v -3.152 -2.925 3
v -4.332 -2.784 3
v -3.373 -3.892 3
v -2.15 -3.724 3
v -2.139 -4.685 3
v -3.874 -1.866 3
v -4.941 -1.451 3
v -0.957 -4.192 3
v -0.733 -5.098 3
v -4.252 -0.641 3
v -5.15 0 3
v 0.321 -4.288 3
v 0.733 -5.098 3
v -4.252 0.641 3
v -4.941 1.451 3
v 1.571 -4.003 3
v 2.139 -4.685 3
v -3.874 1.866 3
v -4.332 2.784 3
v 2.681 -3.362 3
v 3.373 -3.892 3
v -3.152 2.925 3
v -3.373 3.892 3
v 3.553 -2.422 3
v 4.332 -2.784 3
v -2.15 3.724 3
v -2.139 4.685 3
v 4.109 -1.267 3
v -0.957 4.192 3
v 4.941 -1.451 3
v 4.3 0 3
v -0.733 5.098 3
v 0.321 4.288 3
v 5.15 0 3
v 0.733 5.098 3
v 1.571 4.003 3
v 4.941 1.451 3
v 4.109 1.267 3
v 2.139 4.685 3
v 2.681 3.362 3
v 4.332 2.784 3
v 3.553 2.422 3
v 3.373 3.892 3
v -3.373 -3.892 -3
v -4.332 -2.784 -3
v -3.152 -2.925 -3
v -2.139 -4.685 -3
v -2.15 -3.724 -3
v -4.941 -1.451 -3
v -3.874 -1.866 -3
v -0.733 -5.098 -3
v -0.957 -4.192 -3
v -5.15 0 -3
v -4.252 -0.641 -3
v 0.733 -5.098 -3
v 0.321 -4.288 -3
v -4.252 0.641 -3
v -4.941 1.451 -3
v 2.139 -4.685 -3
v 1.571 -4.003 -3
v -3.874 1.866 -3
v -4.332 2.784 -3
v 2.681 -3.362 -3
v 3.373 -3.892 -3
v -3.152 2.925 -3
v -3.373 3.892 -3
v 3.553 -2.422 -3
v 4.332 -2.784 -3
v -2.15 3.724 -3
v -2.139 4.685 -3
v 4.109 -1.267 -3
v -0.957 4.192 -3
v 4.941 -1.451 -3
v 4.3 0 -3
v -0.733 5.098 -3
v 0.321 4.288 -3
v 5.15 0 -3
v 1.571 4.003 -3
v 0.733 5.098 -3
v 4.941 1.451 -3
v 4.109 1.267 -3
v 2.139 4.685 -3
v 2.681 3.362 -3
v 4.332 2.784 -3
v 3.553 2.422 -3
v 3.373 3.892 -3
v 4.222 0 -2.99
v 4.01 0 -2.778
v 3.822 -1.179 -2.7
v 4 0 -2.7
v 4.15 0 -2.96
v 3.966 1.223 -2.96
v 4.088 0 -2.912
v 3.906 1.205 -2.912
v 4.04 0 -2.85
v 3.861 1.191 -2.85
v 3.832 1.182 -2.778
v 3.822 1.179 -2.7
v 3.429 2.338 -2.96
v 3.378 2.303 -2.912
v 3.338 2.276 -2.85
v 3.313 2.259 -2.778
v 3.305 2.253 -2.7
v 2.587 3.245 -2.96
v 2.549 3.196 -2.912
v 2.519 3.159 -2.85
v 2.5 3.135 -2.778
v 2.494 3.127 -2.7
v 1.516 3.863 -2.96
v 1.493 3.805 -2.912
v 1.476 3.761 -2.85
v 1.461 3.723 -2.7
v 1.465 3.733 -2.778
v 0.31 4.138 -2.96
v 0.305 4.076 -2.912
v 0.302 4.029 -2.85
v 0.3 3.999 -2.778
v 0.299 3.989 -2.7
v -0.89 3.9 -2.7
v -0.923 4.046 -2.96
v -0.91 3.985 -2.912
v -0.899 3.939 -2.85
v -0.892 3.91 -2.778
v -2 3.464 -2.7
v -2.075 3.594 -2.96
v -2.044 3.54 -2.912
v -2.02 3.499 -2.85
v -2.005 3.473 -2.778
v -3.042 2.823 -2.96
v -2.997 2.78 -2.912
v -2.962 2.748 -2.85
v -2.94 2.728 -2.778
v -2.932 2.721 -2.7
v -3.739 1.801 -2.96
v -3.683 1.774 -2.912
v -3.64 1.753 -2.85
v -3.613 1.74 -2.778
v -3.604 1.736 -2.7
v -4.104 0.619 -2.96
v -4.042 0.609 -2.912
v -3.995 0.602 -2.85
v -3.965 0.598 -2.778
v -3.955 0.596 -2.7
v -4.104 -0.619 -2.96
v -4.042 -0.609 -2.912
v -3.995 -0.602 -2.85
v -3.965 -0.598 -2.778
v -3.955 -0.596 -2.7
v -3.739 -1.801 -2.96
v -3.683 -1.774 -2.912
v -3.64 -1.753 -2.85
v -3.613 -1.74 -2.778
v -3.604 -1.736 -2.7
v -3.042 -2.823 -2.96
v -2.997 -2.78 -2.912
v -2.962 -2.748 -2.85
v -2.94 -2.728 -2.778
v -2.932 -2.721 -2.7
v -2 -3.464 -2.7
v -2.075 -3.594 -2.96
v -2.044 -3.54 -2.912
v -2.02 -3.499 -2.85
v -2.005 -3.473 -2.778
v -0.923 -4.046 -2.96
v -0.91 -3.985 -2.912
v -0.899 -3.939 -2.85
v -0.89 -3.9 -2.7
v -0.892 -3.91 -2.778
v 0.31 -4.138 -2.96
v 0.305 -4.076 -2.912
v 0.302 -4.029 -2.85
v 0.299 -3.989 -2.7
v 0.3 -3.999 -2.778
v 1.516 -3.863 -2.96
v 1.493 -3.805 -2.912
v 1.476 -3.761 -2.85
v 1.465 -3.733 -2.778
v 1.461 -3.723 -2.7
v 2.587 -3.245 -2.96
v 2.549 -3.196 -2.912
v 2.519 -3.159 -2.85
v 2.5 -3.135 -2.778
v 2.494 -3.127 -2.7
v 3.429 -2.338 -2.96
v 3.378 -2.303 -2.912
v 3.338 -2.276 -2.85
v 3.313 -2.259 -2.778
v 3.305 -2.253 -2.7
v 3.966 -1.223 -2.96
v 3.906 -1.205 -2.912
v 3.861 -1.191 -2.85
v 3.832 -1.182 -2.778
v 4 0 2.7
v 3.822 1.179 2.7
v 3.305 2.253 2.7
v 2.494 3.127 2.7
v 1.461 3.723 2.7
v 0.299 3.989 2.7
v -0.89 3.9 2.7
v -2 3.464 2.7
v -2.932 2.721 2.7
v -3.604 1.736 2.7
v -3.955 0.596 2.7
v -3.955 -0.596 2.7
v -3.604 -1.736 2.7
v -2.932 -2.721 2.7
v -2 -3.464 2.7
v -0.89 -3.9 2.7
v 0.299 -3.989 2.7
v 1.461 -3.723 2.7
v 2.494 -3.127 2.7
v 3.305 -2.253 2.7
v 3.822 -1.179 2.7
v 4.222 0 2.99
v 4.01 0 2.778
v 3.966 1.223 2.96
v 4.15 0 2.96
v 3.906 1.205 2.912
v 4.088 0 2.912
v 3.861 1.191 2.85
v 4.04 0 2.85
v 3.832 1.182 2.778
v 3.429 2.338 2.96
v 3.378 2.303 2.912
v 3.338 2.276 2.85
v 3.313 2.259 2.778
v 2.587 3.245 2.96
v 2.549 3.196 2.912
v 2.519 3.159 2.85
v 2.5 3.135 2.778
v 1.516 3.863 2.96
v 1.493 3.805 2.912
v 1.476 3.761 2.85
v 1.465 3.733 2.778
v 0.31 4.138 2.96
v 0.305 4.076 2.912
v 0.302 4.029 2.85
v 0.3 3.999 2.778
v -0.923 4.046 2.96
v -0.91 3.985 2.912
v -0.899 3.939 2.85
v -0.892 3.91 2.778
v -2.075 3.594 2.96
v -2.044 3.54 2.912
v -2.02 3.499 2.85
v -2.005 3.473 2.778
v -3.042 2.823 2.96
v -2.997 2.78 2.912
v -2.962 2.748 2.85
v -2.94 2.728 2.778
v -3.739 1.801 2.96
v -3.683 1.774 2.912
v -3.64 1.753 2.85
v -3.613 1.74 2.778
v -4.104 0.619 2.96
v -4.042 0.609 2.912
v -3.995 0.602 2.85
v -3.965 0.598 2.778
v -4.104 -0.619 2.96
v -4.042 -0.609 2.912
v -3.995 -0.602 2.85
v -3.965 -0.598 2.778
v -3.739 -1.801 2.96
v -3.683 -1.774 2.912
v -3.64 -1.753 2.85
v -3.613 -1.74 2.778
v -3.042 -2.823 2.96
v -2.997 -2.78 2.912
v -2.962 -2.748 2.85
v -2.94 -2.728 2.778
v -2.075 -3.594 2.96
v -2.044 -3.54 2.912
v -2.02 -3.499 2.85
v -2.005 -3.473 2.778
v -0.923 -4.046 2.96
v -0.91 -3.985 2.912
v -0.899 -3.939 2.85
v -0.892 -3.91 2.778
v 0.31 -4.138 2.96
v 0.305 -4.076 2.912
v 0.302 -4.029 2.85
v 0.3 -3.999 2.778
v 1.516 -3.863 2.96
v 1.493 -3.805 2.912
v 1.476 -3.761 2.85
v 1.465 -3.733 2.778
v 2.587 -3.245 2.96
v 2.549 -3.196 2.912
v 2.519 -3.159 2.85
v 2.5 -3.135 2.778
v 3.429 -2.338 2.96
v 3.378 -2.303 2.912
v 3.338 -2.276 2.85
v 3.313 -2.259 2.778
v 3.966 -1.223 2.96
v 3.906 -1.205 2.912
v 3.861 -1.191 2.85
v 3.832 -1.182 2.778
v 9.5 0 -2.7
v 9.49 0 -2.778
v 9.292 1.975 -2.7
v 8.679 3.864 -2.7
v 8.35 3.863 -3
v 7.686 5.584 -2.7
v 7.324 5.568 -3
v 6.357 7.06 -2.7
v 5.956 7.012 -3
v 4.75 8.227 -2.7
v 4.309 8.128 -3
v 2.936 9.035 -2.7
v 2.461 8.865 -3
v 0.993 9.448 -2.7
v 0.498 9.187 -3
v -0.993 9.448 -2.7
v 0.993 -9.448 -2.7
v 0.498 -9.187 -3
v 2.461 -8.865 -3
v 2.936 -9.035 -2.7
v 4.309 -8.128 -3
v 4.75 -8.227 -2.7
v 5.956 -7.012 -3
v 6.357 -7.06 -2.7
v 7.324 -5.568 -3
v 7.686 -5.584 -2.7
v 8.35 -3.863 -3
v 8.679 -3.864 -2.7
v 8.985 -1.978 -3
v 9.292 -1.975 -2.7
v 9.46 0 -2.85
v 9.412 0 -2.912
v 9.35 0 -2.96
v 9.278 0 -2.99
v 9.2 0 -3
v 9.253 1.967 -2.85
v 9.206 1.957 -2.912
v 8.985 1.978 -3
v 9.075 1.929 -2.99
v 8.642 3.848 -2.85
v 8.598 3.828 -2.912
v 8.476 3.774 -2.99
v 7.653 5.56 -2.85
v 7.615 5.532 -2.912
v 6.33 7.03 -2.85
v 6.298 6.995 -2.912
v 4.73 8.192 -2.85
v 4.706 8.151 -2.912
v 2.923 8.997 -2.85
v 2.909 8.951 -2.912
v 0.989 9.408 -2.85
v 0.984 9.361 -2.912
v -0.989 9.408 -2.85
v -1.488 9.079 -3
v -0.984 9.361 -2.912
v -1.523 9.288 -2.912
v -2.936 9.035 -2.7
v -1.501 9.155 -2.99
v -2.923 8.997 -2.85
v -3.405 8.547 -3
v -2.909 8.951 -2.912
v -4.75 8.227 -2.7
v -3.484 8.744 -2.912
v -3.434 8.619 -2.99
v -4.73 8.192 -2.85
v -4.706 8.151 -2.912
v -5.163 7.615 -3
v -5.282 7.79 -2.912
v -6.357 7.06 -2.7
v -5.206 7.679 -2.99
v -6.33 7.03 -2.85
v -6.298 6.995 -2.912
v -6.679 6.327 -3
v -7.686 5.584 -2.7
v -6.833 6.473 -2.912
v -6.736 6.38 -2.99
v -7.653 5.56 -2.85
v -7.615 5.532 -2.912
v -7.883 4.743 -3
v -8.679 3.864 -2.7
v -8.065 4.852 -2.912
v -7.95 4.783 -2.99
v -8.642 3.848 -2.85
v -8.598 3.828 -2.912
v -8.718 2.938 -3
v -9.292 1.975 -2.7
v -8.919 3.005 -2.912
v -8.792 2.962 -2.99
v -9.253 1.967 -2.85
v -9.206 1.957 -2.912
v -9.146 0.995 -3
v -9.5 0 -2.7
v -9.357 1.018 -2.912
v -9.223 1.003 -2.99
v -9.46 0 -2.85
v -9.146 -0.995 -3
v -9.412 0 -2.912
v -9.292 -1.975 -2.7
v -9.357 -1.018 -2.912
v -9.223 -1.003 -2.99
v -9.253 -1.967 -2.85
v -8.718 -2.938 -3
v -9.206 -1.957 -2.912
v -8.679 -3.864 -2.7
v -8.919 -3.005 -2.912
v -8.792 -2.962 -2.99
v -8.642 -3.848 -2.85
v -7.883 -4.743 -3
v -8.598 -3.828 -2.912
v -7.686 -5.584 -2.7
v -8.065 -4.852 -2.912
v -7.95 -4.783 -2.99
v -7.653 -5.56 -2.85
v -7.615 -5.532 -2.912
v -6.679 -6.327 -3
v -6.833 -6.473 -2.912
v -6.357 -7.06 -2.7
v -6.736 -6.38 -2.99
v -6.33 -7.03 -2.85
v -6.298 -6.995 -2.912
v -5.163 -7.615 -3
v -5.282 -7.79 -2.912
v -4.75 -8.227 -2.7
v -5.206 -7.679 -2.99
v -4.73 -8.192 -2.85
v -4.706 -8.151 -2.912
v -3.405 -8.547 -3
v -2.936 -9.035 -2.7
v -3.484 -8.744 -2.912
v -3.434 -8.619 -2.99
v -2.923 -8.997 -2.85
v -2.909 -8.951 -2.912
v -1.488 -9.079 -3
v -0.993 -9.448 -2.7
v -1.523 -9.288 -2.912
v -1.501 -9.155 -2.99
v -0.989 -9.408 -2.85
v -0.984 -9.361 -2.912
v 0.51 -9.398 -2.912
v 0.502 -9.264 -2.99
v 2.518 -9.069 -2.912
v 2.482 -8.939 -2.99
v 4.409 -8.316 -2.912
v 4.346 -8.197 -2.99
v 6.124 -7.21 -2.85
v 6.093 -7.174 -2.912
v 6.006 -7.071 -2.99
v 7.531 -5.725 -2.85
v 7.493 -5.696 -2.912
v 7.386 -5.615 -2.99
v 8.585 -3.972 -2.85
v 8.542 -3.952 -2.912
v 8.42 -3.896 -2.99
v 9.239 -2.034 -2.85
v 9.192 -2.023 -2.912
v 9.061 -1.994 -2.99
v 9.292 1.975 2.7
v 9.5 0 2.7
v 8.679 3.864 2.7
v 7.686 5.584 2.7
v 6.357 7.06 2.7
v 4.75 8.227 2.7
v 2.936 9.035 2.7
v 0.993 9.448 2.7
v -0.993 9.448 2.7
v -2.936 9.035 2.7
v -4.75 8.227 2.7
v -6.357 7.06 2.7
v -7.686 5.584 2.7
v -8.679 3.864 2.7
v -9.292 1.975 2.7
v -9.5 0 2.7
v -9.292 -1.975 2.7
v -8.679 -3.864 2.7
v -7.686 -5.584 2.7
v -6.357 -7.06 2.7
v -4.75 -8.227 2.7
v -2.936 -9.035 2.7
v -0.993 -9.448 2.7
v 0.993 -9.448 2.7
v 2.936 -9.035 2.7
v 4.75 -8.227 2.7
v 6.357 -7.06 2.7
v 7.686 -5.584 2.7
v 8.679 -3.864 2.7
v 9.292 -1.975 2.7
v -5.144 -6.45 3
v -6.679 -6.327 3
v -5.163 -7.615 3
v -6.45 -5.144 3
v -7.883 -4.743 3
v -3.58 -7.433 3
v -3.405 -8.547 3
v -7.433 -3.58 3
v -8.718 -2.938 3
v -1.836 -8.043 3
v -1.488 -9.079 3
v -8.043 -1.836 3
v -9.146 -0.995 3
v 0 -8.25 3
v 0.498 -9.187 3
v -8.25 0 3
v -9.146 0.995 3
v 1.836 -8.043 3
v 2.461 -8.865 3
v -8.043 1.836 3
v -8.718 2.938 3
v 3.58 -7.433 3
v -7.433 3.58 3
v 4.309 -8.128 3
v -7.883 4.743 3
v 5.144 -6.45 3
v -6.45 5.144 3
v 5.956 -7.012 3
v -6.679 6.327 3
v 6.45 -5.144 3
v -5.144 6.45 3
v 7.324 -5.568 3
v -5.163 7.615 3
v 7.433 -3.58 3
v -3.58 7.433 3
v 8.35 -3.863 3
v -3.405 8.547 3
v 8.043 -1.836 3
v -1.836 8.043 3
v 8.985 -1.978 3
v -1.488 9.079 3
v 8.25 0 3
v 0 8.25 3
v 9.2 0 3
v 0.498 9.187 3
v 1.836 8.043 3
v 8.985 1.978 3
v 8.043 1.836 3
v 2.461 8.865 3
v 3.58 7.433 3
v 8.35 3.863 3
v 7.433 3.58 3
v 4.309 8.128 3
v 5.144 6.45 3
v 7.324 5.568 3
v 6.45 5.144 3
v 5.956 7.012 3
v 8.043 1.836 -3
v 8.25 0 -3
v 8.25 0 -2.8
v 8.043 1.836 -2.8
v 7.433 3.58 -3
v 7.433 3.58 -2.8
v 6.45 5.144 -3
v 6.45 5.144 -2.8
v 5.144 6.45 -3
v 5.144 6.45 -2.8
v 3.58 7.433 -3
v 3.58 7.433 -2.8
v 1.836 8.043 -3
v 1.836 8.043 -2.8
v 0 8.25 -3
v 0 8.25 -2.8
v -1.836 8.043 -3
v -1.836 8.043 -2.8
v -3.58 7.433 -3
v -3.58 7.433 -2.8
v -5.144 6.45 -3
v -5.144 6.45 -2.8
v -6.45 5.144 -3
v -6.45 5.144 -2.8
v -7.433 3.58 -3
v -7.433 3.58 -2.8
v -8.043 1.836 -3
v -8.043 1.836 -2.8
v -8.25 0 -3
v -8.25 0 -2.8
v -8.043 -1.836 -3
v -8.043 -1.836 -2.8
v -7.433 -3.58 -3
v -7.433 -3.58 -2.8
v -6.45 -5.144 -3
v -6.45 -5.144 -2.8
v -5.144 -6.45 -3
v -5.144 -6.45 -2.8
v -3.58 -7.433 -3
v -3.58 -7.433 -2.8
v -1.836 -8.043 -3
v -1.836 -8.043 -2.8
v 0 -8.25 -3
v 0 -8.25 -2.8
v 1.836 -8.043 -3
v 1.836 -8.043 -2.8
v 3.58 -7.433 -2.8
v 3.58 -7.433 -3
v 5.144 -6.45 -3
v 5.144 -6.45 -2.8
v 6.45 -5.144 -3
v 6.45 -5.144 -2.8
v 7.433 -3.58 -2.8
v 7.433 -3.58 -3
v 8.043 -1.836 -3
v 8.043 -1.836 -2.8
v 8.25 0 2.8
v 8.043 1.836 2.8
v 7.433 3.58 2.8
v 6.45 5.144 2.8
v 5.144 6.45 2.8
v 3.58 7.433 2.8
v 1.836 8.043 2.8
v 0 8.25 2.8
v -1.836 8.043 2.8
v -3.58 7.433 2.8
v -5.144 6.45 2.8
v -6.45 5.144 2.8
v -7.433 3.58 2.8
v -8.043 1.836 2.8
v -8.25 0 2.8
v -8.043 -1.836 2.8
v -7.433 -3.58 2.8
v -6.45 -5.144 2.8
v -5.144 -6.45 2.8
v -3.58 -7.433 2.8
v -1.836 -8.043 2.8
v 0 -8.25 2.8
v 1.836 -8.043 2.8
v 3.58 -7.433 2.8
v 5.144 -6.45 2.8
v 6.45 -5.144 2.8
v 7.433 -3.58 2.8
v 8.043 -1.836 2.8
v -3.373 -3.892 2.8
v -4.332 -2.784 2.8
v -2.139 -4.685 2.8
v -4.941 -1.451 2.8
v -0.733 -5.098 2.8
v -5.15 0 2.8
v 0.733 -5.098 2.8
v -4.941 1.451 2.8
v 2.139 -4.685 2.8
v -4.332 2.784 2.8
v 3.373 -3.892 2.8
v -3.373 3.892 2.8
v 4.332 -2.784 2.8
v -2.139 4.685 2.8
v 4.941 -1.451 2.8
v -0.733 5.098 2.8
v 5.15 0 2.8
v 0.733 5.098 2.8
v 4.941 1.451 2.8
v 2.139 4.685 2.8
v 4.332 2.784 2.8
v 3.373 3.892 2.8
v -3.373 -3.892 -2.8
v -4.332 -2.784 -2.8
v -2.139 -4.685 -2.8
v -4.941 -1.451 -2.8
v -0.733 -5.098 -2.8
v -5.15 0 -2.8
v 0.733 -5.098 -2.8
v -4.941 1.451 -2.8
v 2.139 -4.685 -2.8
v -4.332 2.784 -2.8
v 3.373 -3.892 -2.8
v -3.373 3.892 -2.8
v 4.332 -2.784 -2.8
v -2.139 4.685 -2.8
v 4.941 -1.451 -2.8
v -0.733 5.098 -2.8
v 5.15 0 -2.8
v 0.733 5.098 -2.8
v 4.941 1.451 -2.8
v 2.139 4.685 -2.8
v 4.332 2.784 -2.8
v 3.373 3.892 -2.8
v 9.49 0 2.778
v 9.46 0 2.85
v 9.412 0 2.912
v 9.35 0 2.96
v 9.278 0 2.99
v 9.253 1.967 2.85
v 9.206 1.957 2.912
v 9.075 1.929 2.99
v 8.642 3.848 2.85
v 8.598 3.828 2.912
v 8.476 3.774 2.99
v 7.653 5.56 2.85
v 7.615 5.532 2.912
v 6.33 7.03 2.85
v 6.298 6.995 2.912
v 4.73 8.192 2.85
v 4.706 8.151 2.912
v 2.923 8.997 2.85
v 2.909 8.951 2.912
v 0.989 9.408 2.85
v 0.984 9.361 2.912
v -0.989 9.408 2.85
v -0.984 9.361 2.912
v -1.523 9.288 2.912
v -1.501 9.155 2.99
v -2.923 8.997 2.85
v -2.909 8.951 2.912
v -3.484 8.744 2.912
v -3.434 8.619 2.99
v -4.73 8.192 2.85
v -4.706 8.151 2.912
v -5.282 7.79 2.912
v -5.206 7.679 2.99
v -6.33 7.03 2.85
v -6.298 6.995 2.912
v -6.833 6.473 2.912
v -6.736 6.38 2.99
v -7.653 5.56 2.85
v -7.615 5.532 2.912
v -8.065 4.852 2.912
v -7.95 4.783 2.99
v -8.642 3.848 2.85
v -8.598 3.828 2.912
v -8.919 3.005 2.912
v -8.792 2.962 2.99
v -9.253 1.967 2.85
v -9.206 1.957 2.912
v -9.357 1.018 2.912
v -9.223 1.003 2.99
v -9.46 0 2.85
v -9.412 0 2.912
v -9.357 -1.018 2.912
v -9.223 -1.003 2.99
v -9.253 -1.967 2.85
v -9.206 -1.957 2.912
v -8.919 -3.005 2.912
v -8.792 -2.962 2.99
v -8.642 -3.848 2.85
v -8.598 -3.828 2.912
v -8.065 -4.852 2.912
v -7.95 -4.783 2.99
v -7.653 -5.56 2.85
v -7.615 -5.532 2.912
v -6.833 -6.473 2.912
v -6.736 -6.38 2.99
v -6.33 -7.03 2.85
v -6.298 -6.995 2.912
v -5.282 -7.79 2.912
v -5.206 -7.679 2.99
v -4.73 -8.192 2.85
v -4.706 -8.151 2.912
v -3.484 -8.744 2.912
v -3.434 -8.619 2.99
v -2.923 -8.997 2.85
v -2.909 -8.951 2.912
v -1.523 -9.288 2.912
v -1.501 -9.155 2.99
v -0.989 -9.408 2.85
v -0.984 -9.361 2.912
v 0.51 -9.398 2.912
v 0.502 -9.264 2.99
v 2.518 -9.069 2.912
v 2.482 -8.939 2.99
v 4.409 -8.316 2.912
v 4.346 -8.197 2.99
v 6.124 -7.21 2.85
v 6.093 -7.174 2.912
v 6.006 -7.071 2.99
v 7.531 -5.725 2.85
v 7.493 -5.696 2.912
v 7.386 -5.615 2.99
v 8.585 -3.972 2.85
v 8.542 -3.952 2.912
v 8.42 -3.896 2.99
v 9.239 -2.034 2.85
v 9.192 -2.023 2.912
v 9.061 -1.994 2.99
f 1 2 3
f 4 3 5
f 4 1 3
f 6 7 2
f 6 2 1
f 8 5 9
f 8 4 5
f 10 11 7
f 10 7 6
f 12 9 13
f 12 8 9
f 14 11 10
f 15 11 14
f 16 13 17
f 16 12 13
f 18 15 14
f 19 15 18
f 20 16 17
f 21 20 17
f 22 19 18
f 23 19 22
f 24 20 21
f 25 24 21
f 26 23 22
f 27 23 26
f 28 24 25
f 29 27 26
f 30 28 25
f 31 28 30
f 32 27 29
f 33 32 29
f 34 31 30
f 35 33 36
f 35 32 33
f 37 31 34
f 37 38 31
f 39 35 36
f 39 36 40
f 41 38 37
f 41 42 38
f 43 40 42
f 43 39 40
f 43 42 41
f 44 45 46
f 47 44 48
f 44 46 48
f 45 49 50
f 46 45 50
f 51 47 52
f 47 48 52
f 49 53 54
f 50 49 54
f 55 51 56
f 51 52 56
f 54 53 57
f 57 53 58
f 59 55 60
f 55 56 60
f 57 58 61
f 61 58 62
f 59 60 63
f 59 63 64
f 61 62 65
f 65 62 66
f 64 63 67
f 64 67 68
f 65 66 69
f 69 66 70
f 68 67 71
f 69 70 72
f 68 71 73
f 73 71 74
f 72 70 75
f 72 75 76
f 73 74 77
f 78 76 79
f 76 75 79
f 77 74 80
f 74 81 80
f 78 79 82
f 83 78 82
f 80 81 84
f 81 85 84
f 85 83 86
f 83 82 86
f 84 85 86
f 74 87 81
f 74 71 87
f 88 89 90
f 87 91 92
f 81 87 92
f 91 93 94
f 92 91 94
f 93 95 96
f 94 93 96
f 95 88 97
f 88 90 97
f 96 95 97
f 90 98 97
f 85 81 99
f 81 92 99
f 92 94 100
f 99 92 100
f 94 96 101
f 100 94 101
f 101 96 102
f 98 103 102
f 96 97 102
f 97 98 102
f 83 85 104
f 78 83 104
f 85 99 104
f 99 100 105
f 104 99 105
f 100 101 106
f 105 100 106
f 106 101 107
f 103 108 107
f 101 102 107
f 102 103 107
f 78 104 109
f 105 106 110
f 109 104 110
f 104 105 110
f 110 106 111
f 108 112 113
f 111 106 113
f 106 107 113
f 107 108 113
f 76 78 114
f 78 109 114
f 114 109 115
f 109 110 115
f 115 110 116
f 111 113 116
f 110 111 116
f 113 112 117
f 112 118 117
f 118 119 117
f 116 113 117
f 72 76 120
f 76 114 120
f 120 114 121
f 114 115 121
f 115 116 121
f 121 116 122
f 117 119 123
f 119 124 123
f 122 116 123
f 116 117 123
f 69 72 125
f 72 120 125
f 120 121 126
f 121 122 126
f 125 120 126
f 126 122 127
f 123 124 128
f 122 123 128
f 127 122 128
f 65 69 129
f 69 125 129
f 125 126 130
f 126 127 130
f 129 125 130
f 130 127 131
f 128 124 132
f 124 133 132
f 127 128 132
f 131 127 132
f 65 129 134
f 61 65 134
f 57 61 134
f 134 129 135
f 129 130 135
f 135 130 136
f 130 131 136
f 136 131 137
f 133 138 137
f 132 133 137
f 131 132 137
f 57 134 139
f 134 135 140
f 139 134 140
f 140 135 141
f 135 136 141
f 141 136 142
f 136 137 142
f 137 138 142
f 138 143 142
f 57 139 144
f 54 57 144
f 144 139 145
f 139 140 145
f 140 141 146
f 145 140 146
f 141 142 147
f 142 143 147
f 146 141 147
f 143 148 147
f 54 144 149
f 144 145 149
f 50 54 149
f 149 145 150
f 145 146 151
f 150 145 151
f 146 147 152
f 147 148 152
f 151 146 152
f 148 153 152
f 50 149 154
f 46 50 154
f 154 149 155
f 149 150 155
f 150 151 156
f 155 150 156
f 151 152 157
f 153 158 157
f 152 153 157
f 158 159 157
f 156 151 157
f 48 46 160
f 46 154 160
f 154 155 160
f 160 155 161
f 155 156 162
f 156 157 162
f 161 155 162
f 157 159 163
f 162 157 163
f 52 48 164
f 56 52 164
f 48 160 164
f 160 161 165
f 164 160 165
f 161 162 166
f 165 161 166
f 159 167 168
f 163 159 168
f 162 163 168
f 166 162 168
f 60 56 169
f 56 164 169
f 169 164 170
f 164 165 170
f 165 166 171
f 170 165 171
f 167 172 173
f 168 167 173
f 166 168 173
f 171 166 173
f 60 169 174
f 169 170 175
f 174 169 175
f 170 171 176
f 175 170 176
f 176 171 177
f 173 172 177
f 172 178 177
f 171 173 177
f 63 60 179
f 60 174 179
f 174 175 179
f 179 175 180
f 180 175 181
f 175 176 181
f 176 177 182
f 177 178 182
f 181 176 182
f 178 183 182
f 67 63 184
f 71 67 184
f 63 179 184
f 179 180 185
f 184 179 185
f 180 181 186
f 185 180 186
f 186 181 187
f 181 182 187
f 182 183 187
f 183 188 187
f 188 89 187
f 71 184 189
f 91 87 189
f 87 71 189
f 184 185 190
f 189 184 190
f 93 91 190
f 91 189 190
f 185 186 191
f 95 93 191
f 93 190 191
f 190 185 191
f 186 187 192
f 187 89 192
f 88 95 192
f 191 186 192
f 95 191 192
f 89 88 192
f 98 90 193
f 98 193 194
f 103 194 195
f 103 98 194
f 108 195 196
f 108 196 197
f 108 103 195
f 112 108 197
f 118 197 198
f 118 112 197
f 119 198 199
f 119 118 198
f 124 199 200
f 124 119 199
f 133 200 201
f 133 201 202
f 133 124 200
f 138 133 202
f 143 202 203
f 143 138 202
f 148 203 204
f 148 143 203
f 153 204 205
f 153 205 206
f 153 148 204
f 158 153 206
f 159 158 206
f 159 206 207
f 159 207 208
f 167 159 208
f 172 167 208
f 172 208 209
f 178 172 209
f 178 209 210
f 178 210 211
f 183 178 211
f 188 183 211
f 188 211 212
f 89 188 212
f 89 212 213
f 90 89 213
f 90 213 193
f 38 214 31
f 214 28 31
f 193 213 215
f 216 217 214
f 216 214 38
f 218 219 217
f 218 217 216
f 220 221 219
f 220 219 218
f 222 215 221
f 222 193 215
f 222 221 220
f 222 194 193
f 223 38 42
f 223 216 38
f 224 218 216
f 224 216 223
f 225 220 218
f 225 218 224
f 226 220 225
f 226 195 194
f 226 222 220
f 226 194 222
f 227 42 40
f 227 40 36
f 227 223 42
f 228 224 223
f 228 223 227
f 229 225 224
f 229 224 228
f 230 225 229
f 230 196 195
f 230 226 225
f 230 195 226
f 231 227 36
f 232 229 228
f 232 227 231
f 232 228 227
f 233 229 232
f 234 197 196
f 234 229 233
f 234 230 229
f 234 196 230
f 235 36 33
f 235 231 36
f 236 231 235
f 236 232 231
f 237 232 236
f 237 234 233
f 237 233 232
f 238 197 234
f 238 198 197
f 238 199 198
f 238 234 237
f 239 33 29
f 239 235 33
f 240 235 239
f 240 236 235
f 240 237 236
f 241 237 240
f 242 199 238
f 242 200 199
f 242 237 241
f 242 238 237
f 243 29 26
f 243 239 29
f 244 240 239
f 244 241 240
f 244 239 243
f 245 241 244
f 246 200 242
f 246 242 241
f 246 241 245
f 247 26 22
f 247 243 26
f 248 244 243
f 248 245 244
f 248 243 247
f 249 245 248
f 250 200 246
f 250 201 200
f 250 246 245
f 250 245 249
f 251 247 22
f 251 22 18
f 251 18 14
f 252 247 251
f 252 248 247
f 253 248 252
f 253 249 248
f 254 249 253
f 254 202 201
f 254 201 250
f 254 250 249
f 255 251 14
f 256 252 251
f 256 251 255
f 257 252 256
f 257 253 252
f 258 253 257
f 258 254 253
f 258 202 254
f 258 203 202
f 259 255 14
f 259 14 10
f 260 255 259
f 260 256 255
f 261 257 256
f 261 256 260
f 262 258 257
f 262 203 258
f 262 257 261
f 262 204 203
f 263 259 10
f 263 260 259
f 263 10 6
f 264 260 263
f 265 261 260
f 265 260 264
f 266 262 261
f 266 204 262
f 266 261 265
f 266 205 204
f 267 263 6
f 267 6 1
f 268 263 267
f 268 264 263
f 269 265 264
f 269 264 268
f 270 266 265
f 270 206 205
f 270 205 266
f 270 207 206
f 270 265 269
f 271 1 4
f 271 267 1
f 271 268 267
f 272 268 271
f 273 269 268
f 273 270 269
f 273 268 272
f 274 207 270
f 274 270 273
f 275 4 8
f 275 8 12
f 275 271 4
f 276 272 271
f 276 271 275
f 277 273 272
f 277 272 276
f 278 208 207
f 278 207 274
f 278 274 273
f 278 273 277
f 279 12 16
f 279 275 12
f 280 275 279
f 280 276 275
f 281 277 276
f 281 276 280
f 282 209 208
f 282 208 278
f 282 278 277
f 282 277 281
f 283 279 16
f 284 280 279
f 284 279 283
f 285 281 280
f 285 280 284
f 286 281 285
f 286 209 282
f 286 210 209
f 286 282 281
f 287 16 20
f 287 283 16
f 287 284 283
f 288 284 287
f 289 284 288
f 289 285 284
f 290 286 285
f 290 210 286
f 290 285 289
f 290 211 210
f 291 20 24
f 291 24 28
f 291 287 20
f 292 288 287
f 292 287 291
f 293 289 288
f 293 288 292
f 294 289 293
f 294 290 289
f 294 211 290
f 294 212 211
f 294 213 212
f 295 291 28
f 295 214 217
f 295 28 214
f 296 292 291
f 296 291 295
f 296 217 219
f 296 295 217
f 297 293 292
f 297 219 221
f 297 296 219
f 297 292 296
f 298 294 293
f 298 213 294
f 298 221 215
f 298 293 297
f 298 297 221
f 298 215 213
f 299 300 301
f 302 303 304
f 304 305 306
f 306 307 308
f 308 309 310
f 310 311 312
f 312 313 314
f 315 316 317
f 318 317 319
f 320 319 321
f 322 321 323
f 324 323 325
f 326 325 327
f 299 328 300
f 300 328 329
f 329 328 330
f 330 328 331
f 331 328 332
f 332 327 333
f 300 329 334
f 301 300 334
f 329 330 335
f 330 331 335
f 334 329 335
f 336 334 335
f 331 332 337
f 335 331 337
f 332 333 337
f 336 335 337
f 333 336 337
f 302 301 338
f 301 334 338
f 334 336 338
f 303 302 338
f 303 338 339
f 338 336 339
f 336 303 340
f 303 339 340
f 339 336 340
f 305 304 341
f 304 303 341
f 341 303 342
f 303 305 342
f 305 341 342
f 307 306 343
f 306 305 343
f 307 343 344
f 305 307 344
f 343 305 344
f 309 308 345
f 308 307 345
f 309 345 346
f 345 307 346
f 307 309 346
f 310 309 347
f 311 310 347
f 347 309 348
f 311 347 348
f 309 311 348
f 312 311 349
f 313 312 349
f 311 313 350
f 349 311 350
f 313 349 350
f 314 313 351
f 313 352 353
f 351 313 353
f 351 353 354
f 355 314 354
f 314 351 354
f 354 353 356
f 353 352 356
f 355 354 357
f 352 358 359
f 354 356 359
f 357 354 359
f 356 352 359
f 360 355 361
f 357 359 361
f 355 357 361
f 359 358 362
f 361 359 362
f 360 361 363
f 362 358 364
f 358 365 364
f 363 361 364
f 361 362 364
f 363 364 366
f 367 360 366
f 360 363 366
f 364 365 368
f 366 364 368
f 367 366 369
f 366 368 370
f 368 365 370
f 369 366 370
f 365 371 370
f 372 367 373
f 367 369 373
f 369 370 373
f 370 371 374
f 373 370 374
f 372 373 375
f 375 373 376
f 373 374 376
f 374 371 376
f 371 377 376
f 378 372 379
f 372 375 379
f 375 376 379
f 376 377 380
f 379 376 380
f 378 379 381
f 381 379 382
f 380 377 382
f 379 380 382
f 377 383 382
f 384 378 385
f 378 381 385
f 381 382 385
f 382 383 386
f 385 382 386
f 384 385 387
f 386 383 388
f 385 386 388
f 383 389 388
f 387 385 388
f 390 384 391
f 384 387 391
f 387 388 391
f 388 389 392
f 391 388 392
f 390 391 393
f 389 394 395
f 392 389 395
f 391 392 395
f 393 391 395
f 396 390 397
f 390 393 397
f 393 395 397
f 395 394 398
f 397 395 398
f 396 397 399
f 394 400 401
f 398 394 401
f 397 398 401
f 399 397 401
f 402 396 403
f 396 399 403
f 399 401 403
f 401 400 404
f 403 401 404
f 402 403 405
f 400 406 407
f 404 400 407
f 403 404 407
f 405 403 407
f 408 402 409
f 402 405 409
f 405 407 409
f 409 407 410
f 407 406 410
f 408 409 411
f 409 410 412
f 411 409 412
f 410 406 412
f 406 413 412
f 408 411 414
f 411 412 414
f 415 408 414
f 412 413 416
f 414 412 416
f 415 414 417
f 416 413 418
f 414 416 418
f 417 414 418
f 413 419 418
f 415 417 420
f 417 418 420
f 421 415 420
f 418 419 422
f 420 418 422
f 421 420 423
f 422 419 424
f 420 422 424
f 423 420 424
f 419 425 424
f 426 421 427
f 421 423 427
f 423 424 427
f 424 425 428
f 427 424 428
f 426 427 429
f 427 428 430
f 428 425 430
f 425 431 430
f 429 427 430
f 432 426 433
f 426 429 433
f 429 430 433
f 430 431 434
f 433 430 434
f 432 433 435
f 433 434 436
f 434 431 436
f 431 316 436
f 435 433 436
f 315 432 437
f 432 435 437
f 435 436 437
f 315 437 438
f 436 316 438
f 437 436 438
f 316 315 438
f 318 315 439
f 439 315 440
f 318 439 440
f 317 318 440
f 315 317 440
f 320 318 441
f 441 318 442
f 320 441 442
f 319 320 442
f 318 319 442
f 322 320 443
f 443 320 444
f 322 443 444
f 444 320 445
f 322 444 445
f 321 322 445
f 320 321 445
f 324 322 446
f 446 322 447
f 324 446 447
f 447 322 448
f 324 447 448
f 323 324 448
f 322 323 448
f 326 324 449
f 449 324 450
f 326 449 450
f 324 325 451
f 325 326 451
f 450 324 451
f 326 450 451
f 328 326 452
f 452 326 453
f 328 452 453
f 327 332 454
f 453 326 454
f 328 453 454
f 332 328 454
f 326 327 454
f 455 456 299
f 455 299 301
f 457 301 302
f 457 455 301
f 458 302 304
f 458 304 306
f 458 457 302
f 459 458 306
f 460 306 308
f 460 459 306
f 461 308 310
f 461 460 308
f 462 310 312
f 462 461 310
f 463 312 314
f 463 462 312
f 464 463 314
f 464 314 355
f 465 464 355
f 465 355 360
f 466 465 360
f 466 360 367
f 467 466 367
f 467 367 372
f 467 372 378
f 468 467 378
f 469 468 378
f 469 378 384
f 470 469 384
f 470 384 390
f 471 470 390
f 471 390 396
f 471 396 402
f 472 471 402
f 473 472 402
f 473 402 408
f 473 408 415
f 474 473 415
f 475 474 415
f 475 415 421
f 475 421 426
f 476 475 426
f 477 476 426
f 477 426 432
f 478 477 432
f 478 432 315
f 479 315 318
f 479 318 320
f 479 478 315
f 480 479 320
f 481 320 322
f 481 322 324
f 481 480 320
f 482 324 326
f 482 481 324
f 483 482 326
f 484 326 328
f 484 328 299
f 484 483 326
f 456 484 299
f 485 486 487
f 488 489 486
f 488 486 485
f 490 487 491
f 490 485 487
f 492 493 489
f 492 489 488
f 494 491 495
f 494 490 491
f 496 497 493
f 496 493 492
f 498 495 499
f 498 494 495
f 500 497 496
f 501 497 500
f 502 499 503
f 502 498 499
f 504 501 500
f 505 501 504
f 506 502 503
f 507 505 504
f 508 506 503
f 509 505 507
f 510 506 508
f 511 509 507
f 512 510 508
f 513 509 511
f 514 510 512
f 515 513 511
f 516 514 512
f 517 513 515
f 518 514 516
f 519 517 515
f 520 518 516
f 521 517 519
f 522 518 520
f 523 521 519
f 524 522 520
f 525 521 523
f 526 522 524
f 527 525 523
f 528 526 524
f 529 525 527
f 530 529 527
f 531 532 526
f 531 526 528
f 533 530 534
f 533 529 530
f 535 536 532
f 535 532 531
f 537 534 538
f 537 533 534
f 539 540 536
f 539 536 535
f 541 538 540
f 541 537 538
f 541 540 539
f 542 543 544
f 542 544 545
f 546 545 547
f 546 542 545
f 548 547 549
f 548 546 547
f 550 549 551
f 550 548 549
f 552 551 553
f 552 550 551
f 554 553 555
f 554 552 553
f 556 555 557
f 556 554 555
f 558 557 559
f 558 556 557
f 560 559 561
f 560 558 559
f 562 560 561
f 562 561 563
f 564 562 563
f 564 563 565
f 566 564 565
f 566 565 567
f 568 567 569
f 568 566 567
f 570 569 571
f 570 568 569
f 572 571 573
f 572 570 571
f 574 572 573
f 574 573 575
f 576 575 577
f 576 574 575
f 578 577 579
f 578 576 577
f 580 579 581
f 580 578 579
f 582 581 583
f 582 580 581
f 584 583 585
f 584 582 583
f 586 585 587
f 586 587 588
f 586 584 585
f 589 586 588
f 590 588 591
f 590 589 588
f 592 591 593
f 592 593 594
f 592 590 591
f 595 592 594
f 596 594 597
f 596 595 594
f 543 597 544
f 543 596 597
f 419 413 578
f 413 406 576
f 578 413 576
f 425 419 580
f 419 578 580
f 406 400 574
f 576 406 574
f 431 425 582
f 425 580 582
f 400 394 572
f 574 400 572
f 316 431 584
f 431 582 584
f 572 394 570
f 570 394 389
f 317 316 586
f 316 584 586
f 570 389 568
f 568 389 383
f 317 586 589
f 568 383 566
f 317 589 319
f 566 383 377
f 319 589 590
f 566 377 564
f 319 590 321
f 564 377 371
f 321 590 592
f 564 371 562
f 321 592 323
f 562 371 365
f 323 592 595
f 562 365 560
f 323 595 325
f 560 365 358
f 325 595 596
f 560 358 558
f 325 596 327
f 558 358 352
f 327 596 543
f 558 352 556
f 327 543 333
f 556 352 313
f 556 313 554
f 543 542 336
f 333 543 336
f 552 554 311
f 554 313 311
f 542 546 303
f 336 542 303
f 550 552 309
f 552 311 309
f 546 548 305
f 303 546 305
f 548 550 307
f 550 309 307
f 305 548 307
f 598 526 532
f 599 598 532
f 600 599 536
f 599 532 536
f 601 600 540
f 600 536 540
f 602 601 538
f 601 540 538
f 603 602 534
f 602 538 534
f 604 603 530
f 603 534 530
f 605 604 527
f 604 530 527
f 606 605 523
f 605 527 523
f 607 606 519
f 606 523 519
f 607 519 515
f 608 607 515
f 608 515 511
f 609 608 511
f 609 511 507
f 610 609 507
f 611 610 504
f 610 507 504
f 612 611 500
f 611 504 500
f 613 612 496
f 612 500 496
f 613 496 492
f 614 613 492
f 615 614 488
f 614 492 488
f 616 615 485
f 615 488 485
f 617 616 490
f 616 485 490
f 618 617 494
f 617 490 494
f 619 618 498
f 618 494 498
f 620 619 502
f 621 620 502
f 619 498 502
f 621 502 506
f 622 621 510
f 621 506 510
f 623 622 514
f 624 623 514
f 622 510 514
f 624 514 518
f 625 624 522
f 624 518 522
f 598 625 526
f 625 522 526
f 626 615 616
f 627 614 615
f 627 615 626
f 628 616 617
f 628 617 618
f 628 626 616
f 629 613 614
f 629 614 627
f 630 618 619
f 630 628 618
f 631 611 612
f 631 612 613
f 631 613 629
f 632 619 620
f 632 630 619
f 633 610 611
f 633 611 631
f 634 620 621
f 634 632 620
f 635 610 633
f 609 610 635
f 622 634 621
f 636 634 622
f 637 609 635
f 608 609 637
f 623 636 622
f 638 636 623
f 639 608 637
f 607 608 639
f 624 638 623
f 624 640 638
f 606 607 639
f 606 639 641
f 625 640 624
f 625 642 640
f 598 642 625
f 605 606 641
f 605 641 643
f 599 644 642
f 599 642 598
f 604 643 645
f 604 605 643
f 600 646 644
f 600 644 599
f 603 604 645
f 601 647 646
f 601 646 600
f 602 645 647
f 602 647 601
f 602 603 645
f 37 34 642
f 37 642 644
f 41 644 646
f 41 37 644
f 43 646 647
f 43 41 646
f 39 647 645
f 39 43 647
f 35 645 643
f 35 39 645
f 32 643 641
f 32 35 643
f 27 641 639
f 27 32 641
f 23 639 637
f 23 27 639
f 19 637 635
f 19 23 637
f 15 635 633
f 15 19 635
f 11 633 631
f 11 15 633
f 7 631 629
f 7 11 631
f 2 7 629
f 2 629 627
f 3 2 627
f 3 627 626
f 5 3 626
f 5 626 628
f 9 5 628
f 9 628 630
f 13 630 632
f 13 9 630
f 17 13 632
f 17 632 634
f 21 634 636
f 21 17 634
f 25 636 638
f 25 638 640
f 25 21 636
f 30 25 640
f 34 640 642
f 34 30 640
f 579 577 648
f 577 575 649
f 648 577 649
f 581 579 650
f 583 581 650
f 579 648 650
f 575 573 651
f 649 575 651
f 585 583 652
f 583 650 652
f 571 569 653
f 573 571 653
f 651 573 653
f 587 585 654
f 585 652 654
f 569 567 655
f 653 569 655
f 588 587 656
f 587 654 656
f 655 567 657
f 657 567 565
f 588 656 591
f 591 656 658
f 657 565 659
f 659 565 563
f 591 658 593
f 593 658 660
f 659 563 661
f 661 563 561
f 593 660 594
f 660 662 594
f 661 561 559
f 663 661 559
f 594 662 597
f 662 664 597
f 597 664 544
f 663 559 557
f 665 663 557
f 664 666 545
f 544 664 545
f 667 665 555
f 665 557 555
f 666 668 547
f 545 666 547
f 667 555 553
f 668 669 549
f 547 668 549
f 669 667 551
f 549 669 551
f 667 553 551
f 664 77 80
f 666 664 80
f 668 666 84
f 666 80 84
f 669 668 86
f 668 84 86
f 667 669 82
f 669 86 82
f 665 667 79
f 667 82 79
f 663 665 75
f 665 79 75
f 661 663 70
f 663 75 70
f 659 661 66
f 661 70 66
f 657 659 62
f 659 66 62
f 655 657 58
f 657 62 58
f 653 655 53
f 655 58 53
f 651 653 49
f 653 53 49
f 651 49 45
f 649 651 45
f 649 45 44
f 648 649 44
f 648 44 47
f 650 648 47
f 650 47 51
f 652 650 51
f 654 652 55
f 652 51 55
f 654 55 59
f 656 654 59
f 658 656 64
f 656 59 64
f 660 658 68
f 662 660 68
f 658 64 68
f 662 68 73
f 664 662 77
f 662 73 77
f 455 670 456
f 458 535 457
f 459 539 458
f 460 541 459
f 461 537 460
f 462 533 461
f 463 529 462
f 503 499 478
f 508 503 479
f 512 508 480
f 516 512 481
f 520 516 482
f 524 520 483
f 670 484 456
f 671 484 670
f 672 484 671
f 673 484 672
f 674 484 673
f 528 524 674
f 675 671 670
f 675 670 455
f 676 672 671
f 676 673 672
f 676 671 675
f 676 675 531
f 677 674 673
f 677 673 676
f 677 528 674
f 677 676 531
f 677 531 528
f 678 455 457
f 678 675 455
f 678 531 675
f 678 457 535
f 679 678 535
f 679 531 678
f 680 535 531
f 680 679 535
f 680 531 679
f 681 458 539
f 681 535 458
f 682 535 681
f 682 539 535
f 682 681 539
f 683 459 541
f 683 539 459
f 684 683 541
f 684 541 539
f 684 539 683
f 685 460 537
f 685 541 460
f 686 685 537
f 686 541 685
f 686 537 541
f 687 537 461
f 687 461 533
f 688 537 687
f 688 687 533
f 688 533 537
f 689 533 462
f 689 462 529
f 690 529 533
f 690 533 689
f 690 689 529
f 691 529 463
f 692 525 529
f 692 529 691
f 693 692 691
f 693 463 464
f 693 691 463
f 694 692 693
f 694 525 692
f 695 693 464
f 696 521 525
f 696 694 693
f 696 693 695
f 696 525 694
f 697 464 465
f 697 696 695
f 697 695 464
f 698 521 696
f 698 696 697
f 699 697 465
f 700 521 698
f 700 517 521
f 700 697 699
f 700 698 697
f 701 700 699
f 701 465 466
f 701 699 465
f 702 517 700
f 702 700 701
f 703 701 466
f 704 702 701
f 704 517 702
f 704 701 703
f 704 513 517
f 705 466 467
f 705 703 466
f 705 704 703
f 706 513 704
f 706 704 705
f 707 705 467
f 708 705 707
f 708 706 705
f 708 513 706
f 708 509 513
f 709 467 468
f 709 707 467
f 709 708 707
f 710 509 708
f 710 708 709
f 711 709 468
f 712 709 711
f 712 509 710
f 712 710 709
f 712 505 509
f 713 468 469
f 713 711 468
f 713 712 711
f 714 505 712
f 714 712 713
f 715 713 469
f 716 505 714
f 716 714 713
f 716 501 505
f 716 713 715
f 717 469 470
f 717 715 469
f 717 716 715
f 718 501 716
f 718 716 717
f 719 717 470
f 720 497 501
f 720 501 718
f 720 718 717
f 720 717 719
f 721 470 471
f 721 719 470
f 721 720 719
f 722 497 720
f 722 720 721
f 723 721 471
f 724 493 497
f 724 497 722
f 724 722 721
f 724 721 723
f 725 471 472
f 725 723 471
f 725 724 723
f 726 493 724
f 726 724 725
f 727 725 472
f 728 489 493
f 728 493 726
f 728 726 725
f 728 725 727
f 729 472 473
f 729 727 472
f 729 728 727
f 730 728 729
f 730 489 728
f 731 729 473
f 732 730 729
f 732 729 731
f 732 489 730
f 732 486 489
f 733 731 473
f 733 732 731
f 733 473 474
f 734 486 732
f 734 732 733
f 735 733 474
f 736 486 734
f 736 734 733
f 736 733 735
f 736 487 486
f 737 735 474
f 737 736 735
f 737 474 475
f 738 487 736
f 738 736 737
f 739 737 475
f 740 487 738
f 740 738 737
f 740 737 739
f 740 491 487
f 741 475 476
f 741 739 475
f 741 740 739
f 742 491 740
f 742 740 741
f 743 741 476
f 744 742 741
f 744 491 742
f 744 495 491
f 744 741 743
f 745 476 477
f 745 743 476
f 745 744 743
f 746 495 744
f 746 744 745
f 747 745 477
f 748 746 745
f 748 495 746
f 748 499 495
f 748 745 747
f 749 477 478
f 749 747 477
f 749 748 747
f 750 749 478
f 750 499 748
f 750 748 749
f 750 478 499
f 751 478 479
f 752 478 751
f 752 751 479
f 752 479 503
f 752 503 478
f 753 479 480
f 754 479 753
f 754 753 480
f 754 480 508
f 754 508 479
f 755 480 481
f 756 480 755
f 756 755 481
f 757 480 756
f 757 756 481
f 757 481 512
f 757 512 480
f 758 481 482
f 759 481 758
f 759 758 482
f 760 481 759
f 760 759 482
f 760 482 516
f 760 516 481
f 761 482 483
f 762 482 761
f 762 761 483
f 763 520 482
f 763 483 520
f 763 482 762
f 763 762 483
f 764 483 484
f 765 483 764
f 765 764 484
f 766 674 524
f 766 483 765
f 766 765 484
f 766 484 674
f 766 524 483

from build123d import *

# Parameters (mm, degrees)
SKETCH_1_R          = 9.5
SKETCH_1_R_2        = 4
EXTRUDE_1_DEPTH     = 3
SKETCH_2_R          = 8.25
SKETCH_2_R_2        = 5.15
CUT_EXTRUDE_2_DEPTH = 0.2
FILLET_1_R          = 0.3


with BuildPart() as part:
    # 草图1 → 拉伸1 (new, symmetric)
    with BuildSketch(Plane.XY):
        Circle(SKETCH_1_R)
        Circle(SKETCH_1_R_2, mode=Mode.SUBTRACT)
    extrude(amount=EXTRUDE_1_DEPTH, both=True)

    # 草图2 → 拉伸2 (cut)
    with BuildSketch(Plane.XY.offset(3)):
        Circle(SKETCH_2_R)
        Circle(SKETCH_2_R_2, mode=Mode.SUBTRACT)
    cut_extrude_2 = extrude(amount=-CUT_EXTRUDE_2_DEPTH, mode=Mode.SUBTRACT)

    # 镜向1: 拉伸2 across plane
    add(cut_extrude_2.mirror(Plane.XY), mode=Mode.SUBTRACT)

    # 圆角1
    fillet_1_edges = [part.edges().sort_by_distance(p)[0] for p in [
        (-9.5, 0, -3),
        (-9.5, 0, 3),
        (-4, 0, -3),
        (-4, 0, 3),
    ]]
    fillet(fillet_1_edges, radius=FILLET_1_R)


solid = part.part
